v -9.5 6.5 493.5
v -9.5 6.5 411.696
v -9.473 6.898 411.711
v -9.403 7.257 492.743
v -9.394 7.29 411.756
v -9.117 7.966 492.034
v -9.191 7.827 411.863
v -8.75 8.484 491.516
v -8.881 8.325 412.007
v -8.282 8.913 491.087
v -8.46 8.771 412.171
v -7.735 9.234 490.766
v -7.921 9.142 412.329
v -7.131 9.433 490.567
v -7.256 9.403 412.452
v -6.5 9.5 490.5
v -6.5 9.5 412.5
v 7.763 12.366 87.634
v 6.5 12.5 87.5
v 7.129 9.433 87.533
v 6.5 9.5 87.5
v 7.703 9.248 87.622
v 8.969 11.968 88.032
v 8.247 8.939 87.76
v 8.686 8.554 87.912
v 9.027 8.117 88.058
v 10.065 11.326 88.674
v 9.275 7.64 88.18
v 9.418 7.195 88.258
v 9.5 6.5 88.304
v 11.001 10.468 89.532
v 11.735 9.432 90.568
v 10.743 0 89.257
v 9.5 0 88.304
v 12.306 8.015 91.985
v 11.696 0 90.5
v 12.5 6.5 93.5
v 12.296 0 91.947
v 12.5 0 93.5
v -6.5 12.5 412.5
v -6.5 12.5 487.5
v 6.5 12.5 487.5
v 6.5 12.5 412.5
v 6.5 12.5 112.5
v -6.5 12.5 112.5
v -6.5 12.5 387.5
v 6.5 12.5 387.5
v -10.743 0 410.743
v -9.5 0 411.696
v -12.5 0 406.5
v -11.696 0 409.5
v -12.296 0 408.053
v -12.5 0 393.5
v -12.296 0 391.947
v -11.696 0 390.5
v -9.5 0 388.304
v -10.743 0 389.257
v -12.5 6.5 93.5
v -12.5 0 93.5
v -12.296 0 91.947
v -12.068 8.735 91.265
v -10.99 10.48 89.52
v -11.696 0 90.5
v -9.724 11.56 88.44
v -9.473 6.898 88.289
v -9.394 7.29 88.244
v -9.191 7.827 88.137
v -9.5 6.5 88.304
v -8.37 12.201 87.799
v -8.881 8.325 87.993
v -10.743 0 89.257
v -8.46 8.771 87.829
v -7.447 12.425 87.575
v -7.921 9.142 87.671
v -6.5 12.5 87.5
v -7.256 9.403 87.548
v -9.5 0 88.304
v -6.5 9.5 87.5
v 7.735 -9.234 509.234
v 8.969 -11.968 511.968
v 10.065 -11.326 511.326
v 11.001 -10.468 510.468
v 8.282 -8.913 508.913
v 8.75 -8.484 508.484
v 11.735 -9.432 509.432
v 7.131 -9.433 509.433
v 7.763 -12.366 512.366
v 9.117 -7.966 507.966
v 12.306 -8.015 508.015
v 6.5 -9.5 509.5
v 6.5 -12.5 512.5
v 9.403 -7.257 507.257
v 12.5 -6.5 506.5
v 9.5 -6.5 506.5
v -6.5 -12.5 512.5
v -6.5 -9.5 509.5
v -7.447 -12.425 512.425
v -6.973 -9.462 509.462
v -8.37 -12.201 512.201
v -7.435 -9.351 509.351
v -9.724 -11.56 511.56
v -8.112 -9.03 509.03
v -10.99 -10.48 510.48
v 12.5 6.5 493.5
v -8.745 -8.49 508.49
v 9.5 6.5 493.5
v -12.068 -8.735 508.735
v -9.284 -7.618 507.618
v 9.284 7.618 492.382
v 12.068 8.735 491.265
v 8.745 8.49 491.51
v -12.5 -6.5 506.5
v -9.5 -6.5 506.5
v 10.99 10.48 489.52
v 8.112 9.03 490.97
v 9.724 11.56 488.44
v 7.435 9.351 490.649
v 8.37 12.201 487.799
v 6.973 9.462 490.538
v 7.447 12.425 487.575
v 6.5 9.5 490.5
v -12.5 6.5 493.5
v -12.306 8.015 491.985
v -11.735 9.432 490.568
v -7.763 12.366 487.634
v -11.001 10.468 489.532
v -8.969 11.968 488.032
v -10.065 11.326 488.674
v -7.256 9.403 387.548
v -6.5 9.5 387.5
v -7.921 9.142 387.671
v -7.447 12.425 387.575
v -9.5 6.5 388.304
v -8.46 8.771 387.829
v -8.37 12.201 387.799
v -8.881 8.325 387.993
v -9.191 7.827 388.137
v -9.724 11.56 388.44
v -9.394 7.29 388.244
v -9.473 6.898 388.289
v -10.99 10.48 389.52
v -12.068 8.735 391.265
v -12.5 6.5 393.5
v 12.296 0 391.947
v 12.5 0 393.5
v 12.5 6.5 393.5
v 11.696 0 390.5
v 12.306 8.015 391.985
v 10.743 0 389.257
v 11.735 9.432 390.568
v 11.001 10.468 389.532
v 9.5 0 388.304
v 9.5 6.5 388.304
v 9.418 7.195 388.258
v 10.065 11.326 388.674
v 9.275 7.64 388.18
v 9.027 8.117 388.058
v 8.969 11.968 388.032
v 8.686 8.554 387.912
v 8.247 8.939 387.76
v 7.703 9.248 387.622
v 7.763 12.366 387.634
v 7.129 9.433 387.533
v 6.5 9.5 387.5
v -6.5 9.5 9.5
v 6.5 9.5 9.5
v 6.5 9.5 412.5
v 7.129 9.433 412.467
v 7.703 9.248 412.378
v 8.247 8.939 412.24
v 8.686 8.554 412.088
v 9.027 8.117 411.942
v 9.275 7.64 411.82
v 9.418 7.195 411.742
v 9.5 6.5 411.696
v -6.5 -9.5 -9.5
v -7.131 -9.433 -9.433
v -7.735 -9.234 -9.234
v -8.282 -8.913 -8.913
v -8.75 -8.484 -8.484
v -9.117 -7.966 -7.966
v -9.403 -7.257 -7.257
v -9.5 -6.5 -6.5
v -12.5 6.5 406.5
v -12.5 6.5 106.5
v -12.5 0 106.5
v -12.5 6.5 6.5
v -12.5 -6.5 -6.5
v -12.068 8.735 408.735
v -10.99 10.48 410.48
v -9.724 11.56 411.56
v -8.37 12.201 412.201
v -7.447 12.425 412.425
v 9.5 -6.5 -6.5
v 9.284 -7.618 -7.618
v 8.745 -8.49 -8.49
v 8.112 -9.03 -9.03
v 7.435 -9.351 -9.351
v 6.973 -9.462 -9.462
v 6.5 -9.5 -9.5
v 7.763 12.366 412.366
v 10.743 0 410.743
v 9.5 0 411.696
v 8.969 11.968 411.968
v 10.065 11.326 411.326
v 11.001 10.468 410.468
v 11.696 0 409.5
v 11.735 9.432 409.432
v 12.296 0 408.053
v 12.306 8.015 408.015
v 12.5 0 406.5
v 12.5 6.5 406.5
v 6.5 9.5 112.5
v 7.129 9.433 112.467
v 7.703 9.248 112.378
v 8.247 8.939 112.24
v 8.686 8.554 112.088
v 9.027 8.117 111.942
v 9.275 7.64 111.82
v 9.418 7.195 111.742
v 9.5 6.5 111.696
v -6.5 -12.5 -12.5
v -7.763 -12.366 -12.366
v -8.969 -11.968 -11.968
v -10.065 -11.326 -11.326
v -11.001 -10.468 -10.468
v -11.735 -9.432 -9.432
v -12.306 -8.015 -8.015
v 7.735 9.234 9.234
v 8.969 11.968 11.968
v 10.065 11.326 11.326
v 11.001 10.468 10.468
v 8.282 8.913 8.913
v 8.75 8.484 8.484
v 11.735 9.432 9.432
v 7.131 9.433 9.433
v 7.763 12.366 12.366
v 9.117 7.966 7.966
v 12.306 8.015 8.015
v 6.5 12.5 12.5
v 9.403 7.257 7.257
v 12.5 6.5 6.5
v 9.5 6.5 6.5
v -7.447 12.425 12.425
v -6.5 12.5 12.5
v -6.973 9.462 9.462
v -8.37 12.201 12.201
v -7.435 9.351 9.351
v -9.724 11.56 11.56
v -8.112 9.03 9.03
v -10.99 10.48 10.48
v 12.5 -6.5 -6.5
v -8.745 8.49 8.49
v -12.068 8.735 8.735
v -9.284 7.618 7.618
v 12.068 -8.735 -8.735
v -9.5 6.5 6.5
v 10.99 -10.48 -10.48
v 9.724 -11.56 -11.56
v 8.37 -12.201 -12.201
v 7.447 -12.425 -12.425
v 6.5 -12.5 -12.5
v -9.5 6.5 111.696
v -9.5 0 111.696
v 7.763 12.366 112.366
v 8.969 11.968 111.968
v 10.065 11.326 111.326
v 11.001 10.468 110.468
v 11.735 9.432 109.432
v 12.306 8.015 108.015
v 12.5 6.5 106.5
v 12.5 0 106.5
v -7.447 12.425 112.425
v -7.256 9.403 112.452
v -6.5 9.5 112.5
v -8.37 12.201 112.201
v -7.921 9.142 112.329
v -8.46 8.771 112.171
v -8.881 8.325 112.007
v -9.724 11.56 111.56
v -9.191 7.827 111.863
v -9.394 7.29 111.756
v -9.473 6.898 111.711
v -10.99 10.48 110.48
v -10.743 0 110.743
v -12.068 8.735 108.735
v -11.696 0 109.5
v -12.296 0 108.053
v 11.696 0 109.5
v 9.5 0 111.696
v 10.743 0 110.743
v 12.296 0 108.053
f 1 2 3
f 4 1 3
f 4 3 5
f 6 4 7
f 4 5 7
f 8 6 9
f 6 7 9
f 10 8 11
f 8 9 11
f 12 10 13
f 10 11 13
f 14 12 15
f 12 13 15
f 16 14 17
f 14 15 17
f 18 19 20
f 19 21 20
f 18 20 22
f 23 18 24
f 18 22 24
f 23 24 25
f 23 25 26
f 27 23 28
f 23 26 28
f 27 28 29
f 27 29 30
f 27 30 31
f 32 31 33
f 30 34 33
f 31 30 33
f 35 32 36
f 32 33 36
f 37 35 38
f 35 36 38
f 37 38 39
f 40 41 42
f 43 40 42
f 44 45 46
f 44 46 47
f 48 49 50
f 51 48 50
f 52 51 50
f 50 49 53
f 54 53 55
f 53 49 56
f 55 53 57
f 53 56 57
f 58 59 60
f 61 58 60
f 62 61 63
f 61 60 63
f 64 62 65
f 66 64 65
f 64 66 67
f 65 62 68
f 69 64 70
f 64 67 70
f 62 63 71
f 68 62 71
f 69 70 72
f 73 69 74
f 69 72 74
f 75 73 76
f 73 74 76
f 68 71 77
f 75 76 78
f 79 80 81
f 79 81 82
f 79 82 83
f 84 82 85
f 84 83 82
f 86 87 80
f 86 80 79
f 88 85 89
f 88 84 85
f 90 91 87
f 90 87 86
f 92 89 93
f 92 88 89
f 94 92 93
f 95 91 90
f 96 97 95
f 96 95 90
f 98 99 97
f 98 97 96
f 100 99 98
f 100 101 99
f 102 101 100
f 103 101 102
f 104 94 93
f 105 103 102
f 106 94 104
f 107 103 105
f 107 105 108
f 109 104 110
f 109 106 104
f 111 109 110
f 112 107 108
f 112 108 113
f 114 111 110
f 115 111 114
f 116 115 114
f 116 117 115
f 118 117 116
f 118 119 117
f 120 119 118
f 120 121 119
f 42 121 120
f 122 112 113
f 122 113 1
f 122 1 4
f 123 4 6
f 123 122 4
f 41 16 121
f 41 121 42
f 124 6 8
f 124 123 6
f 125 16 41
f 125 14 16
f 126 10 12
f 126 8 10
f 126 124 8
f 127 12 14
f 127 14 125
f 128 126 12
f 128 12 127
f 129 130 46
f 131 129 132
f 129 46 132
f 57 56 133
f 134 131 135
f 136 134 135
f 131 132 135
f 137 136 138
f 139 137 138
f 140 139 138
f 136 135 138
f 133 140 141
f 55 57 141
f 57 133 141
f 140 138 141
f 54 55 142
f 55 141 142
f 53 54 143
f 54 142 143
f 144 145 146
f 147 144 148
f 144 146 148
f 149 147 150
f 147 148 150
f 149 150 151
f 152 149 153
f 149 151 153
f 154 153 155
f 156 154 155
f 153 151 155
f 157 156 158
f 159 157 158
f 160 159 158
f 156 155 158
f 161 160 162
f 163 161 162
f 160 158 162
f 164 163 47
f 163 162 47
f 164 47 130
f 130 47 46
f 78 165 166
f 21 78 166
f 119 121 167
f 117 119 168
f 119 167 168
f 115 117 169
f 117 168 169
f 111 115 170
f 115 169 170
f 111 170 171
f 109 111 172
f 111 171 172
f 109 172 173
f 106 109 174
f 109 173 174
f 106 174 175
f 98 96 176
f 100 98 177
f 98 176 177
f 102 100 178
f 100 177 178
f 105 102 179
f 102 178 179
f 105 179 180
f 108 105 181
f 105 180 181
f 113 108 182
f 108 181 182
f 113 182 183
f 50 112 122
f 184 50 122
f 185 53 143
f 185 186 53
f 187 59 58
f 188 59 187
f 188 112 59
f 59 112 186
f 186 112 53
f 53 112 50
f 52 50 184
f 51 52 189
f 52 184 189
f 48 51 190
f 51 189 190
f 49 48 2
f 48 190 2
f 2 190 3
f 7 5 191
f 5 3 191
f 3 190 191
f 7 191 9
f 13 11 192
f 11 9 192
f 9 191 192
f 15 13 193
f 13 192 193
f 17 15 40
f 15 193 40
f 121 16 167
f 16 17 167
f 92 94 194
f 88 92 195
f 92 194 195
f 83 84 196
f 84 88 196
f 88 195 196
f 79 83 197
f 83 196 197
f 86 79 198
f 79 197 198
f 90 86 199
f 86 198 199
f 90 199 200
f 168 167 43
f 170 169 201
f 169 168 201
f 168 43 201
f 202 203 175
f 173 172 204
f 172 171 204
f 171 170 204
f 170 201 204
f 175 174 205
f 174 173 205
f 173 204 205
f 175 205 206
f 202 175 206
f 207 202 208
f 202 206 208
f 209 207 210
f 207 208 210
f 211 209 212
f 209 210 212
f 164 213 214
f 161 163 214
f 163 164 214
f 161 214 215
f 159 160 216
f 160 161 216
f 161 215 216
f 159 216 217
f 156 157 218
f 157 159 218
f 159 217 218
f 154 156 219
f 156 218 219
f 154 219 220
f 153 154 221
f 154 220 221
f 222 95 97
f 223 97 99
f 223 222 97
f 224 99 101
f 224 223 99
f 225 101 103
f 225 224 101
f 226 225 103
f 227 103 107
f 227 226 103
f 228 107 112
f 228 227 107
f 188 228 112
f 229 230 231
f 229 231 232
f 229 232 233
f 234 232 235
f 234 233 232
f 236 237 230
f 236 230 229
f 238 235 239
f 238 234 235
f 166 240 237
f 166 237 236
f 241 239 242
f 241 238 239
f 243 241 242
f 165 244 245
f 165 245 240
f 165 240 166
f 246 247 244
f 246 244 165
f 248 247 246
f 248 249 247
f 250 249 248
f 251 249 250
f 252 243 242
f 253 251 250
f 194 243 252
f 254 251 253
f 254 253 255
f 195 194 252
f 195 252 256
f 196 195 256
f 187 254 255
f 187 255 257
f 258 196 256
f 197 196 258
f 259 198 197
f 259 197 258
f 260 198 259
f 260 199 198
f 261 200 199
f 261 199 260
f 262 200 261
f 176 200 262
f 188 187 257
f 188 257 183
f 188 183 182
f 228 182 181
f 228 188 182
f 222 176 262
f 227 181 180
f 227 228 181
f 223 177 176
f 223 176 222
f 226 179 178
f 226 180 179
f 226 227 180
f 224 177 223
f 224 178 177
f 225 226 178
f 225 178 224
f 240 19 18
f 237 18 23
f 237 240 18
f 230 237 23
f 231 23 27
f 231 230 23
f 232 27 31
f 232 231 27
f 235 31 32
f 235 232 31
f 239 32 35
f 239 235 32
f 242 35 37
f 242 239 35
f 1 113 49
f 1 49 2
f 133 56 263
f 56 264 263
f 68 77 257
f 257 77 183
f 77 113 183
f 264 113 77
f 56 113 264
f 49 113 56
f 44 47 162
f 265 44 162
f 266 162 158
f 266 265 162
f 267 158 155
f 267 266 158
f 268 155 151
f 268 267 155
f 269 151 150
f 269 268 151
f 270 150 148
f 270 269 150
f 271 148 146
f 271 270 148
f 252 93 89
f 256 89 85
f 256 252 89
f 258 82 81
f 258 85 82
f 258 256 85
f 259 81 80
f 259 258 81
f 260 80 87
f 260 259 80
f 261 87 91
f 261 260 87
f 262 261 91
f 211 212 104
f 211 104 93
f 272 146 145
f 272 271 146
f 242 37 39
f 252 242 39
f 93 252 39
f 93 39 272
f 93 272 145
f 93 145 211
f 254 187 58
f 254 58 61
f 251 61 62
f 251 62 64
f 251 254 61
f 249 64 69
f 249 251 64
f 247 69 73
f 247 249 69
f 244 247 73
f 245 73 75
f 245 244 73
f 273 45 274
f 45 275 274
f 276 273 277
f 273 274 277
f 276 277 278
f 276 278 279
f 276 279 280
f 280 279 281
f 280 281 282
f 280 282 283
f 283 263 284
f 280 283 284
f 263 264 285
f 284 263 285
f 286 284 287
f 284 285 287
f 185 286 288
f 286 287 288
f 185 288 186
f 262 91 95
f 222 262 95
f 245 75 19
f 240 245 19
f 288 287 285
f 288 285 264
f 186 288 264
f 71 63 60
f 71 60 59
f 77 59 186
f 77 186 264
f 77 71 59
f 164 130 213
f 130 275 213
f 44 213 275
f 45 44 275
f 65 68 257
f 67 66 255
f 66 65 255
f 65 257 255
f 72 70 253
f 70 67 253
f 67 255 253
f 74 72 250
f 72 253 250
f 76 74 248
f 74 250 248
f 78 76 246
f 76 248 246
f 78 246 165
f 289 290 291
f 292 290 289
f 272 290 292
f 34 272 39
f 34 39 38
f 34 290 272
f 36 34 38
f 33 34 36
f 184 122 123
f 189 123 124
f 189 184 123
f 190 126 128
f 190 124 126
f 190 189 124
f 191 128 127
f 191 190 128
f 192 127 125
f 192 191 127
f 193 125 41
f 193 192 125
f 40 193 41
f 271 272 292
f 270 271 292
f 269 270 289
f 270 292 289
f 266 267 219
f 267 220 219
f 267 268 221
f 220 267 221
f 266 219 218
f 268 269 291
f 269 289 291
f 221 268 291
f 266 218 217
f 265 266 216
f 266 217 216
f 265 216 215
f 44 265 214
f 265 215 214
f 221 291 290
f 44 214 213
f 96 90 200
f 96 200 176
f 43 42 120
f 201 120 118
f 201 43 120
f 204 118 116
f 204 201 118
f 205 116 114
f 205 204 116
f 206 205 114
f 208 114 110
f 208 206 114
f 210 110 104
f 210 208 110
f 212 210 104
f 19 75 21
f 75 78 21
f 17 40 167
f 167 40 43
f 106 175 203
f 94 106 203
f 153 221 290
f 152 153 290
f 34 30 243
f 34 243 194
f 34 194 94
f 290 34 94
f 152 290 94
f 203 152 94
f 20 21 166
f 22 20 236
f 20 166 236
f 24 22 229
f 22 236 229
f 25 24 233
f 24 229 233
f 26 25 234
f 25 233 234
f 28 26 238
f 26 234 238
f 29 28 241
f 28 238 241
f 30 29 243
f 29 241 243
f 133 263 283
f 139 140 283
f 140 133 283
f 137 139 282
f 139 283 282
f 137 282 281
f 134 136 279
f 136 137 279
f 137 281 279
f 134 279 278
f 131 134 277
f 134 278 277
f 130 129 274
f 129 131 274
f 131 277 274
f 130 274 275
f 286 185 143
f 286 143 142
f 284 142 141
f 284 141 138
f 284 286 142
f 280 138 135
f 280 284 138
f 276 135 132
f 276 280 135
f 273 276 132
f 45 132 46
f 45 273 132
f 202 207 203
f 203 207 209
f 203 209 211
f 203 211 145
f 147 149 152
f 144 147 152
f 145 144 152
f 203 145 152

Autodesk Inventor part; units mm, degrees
ref_plane "Start plane" through (0, 0, -12.5) normal (0, 0, 1) x (1, 0, 0)
ref_plane "End plane" through (0, 0, 512.5) normal (0, 0, 1) x (1, 0, 0)
sketch "Sketch" plane through (0, 0, 0) normal (0, 0, 1) x (1, 0, 0)
  line L0 (-12.5, -6.5) -> (-12.5, 6.5)
  line L1 (-6.5, 12.5) -> (6.5, 12.5)
  line L2 (12.5, 6.5) -> (12.5, -6.5)
  line L3 (6.5, -12.5) -> (-6.5, -12.5)
  arc A0 (-12.5, -6.5) -> (-6.5, -12.5) centre (-6.5, -6.5) ccw
  arc A1 (-6.5, 12.5) -> (-12.5, 6.5) centre (-6.5, 6.5) ccw
  arc A2 (12.5, 6.5) -> (6.5, 12.5) centre (6.5, 6.5) ccw
  arc A3 (6.5, -12.5) -> (12.5, -6.5) centre (6.5, -6.5) ccw
  arc A4 (-6.5, 9.5) -> (-9.5, 6.5) centre (-6.5, 6.5) ccw
  line L4 (-6.5, 9.5) -> (6.5, 9.5)
  arc A5 (9.5, 6.5) -> (6.5, 9.5) centre (6.5, 6.5) ccw
  line L5 (9.5, 6.5) -> (9.5, -6.5)
  arc A6 (6.5, -9.5) -> (9.5, -6.5) centre (6.5, -6.5) ccw
  line L6 (6.5, -9.5) -> (-6.5, -9.5)
  arc A7 (-9.5, -6.5) -> (-6.5, -9.5) centre (-6.5, -6.5) ccw
  line L7 (-9.5, -6.5) -> (-9.5, 6.5)
  line L8 (0, 19.2397) -> (0, -19.2397) construction
  line L9 (-19.2397, 0) -> (19.2397, 0) construction
  dimension "d7" = 6
  dimension "d10" = 25
  dimension "d11" = 25
  dimension "d12" = 3
  dimension "d15" = 12.5
  dimension "d16" = 12.5
extrude "Body" add sketch "Sketch" along normal up to surface (525 mm away) from surface at -12.5
sketch "Sketch3" plane through (0, 0, 0) normal (0, 0, 1) x (1, 0, 0)
  line L0 (0, 0) -> (10, 0)
ref_plane "Work Plane3" through (0, 0, 0) normal (0, -1, 0) x (1, 0, 0)
sketch "Sketch4" plane through (0, 0, 0) normal (0, -1, 0) x (1, 0, 0)
  line L0 (-2, -12.5) -> (12, -12.5)
  line L1 (-2, 512.5) -> (12, 512.5)
  dimension "d18" = 525
ref_plane "Work Plane4" through (0, 0, 512.5) normal (0, 0, 1) x (1, 0, 0)
split "Split1" plane through (0, 0, 512.5) removes the side toward (0, 0, 1)
ref_plane "Work Plane5" through (0, -12.5, -12.5) normal (0, 0.7071, -0.7071) x (1, 0, 0)
split "Split2" plane through (0, -12.5, -12.5) removes the side toward (0, 0.7071, -0.7071)
ref_plane "Work Plane6" through (0, -12.5, 512.5) normal (0, 0.7071, 0.7071) x (1, 0, 0)
split "Split3" plane through (0, -12.5, 512.5) removes the side toward (0, 0.7071, 0.7071)
ref_plane "Work Plane7" through (0, 0, 100) normal (0, 1, 0) x (1, 0, 0)
ref_plane "Work Plane8" through (0, 800, 100) normal (0, 1, 0) x (1, 0, 0)
ref_plane "Work Plane9" through (0, 400, 100) normal (0, 1, 0) x (1, 0, 0)
sketch "Sketch5" plane through (0, 400, 100) normal (0, 1, 0) x (1, 0, 0)
  arc A0 (-12.5, -6.5) -> (-6.5, -12.5) centre (-6.5, -6.5) ccw
  line L0 (-12.5, -6.5) -> (-12.5, 6.5)
  arc A1 (-6.5, 12.5) -> (-12.5, 6.5) centre (-6.5, 6.5) ccw
  line L1 (-6.5, 12.5) -> (6.5, 12.5)
  arc A2 (12.5, 6.5) -> (6.5, 12.5) centre (6.5, 6.5) ccw
  line L2 (12.5, 6.5) -> (12.5, -6.5)
  arc A3 (6.5, -12.5) -> (12.5, -6.5) centre (6.5, -6.5) ccw
  line L3 (6.5, -12.5) -> (-6.5, -12.5)
  arc A4 (-6.5, 9.5) -> (-9.5, 6.5) centre (-6.5, 6.5) ccw
  line L4 (-6.5, 9.5) -> (6.5, 9.5)
  arc A5 (9.5, 6.5) -> (6.5, 9.5) centre (6.5, 6.5) ccw
  line L5 (9.5, 6.5) -> (9.5, -6.5)
  arc A6 (6.5, -9.5) -> (9.5, -6.5) centre (6.5, -6.5) ccw
  line L6 (6.5, -9.5) -> (-6.5, -9.5)
  arc A7 (-9.5, -6.5) -> (-6.5, -9.5) centre (-6.5, -6.5) ccw
  line L7 (-9.5, -6.5) -> (-9.5, 6.5)
extrude "Extrusion2" cut sketch "Sketch5" along normal up to surface (800 mm away) from surface at -400 contours L0 A1 L1 A2 L2 A3 L3 A0 | L4 A5 L5 A6 L6 A7 L7 A4
ref_plane "Work Plane10" through (0, 800, 400) normal (0, -1, 0) x (-1, 0, 0)
ref_plane "Work Plane11" through (0, 0, 400) normal (0, -1, 0) x (-1, 0, 0)
ref_plane "Work Plane12" through (0, 400, 400) normal (0, -1, 0) x (-1, 0, 0)
sketch "Sketch6" plane through (0, 400, 400) normal (0, -1, 0) x (-1, 0, 0)
  arc A0 (-12.5, -6.5) -> (-6.5, -12.5) centre (-6.5, -6.5) ccw
  line L0 (-12.5, -6.5) -> (-12.5, 6.5)
  arc A1 (-6.5, 12.5) -> (-12.5, 6.5) centre (-6.5, 6.5) ccw
  line L1 (-6.5, 12.5) -> (6.5, 12.5)
  arc A2 (12.5, 6.5) -> (6.5, 12.5) centre (6.5, 6.5) ccw
  line L2 (12.5, 6.5) -> (12.5, -6.5)
  arc A3 (6.5, -12.5) -> (12.5, -6.5) centre (6.5, -6.5) ccw
  line L3 (6.5, -12.5) -> (-6.5, -12.5)
  arc A4 (-6.5, 9.5) -> (-9.5, 6.5) centre (-6.5, 6.5) ccw
  line L4 (-6.5, 9.5) -> (6.5, 9.5)
  arc A5 (9.5, 6.5) -> (6.5, 9.5) centre (6.5, 6.5) ccw
  line L5 (9.5, 6.5) -> (9.5, -6.5)
  arc A6 (6.5, -9.5) -> (9.5, -6.5) centre (6.5, -6.5) ccw
  line L6 (6.5, -9.5) -> (-6.5, -9.5)
  arc A7 (-9.5, -6.5) -> (-6.5, -9.5) centre (-6.5, -6.5) ccw
  line L7 (-9.5, -6.5) -> (-9.5, 6.5)
extrude "Extrusion3" cut sketch "Sketch6" along normal up to surface (800 mm away) from surface at -400 contours L0 A1 L1 A2 L2 A3 L3 A0 | L4 A5 L5 A6 L6 A7 L7 A4
equation "\"d7\" = G_IR"
equation "\"d10\" = G_H"
equation "\"d11\" = G_W"
equation "\"d12\" = G_T"
equation "\"d15\" = 0.5 * d10"
equation "\"d16\" = 0.5 * d11"
equation "\"d3\" = G_L"
equation "\"G_W\" = 25"
equation "\"G_H\" = 25"
equation "\"G_T\" = 3"
equation "\"G_IR\" = 6"
equation "\"G_L\" = d18"
equation "\"G_OFFSET_START\" = 12.5"
equation "\"G_OFFSET_END\" = 12.5"
equation "\"d13\" = -G_OFFSET_START"
equation "\"d14\" = G_OFFSET_END + B_L"
equation "\"B_L\" = 500"
properties part number "AS 1163 - C350L0 25x25x3.0 SHS - 525" material "Steel, Mild"
